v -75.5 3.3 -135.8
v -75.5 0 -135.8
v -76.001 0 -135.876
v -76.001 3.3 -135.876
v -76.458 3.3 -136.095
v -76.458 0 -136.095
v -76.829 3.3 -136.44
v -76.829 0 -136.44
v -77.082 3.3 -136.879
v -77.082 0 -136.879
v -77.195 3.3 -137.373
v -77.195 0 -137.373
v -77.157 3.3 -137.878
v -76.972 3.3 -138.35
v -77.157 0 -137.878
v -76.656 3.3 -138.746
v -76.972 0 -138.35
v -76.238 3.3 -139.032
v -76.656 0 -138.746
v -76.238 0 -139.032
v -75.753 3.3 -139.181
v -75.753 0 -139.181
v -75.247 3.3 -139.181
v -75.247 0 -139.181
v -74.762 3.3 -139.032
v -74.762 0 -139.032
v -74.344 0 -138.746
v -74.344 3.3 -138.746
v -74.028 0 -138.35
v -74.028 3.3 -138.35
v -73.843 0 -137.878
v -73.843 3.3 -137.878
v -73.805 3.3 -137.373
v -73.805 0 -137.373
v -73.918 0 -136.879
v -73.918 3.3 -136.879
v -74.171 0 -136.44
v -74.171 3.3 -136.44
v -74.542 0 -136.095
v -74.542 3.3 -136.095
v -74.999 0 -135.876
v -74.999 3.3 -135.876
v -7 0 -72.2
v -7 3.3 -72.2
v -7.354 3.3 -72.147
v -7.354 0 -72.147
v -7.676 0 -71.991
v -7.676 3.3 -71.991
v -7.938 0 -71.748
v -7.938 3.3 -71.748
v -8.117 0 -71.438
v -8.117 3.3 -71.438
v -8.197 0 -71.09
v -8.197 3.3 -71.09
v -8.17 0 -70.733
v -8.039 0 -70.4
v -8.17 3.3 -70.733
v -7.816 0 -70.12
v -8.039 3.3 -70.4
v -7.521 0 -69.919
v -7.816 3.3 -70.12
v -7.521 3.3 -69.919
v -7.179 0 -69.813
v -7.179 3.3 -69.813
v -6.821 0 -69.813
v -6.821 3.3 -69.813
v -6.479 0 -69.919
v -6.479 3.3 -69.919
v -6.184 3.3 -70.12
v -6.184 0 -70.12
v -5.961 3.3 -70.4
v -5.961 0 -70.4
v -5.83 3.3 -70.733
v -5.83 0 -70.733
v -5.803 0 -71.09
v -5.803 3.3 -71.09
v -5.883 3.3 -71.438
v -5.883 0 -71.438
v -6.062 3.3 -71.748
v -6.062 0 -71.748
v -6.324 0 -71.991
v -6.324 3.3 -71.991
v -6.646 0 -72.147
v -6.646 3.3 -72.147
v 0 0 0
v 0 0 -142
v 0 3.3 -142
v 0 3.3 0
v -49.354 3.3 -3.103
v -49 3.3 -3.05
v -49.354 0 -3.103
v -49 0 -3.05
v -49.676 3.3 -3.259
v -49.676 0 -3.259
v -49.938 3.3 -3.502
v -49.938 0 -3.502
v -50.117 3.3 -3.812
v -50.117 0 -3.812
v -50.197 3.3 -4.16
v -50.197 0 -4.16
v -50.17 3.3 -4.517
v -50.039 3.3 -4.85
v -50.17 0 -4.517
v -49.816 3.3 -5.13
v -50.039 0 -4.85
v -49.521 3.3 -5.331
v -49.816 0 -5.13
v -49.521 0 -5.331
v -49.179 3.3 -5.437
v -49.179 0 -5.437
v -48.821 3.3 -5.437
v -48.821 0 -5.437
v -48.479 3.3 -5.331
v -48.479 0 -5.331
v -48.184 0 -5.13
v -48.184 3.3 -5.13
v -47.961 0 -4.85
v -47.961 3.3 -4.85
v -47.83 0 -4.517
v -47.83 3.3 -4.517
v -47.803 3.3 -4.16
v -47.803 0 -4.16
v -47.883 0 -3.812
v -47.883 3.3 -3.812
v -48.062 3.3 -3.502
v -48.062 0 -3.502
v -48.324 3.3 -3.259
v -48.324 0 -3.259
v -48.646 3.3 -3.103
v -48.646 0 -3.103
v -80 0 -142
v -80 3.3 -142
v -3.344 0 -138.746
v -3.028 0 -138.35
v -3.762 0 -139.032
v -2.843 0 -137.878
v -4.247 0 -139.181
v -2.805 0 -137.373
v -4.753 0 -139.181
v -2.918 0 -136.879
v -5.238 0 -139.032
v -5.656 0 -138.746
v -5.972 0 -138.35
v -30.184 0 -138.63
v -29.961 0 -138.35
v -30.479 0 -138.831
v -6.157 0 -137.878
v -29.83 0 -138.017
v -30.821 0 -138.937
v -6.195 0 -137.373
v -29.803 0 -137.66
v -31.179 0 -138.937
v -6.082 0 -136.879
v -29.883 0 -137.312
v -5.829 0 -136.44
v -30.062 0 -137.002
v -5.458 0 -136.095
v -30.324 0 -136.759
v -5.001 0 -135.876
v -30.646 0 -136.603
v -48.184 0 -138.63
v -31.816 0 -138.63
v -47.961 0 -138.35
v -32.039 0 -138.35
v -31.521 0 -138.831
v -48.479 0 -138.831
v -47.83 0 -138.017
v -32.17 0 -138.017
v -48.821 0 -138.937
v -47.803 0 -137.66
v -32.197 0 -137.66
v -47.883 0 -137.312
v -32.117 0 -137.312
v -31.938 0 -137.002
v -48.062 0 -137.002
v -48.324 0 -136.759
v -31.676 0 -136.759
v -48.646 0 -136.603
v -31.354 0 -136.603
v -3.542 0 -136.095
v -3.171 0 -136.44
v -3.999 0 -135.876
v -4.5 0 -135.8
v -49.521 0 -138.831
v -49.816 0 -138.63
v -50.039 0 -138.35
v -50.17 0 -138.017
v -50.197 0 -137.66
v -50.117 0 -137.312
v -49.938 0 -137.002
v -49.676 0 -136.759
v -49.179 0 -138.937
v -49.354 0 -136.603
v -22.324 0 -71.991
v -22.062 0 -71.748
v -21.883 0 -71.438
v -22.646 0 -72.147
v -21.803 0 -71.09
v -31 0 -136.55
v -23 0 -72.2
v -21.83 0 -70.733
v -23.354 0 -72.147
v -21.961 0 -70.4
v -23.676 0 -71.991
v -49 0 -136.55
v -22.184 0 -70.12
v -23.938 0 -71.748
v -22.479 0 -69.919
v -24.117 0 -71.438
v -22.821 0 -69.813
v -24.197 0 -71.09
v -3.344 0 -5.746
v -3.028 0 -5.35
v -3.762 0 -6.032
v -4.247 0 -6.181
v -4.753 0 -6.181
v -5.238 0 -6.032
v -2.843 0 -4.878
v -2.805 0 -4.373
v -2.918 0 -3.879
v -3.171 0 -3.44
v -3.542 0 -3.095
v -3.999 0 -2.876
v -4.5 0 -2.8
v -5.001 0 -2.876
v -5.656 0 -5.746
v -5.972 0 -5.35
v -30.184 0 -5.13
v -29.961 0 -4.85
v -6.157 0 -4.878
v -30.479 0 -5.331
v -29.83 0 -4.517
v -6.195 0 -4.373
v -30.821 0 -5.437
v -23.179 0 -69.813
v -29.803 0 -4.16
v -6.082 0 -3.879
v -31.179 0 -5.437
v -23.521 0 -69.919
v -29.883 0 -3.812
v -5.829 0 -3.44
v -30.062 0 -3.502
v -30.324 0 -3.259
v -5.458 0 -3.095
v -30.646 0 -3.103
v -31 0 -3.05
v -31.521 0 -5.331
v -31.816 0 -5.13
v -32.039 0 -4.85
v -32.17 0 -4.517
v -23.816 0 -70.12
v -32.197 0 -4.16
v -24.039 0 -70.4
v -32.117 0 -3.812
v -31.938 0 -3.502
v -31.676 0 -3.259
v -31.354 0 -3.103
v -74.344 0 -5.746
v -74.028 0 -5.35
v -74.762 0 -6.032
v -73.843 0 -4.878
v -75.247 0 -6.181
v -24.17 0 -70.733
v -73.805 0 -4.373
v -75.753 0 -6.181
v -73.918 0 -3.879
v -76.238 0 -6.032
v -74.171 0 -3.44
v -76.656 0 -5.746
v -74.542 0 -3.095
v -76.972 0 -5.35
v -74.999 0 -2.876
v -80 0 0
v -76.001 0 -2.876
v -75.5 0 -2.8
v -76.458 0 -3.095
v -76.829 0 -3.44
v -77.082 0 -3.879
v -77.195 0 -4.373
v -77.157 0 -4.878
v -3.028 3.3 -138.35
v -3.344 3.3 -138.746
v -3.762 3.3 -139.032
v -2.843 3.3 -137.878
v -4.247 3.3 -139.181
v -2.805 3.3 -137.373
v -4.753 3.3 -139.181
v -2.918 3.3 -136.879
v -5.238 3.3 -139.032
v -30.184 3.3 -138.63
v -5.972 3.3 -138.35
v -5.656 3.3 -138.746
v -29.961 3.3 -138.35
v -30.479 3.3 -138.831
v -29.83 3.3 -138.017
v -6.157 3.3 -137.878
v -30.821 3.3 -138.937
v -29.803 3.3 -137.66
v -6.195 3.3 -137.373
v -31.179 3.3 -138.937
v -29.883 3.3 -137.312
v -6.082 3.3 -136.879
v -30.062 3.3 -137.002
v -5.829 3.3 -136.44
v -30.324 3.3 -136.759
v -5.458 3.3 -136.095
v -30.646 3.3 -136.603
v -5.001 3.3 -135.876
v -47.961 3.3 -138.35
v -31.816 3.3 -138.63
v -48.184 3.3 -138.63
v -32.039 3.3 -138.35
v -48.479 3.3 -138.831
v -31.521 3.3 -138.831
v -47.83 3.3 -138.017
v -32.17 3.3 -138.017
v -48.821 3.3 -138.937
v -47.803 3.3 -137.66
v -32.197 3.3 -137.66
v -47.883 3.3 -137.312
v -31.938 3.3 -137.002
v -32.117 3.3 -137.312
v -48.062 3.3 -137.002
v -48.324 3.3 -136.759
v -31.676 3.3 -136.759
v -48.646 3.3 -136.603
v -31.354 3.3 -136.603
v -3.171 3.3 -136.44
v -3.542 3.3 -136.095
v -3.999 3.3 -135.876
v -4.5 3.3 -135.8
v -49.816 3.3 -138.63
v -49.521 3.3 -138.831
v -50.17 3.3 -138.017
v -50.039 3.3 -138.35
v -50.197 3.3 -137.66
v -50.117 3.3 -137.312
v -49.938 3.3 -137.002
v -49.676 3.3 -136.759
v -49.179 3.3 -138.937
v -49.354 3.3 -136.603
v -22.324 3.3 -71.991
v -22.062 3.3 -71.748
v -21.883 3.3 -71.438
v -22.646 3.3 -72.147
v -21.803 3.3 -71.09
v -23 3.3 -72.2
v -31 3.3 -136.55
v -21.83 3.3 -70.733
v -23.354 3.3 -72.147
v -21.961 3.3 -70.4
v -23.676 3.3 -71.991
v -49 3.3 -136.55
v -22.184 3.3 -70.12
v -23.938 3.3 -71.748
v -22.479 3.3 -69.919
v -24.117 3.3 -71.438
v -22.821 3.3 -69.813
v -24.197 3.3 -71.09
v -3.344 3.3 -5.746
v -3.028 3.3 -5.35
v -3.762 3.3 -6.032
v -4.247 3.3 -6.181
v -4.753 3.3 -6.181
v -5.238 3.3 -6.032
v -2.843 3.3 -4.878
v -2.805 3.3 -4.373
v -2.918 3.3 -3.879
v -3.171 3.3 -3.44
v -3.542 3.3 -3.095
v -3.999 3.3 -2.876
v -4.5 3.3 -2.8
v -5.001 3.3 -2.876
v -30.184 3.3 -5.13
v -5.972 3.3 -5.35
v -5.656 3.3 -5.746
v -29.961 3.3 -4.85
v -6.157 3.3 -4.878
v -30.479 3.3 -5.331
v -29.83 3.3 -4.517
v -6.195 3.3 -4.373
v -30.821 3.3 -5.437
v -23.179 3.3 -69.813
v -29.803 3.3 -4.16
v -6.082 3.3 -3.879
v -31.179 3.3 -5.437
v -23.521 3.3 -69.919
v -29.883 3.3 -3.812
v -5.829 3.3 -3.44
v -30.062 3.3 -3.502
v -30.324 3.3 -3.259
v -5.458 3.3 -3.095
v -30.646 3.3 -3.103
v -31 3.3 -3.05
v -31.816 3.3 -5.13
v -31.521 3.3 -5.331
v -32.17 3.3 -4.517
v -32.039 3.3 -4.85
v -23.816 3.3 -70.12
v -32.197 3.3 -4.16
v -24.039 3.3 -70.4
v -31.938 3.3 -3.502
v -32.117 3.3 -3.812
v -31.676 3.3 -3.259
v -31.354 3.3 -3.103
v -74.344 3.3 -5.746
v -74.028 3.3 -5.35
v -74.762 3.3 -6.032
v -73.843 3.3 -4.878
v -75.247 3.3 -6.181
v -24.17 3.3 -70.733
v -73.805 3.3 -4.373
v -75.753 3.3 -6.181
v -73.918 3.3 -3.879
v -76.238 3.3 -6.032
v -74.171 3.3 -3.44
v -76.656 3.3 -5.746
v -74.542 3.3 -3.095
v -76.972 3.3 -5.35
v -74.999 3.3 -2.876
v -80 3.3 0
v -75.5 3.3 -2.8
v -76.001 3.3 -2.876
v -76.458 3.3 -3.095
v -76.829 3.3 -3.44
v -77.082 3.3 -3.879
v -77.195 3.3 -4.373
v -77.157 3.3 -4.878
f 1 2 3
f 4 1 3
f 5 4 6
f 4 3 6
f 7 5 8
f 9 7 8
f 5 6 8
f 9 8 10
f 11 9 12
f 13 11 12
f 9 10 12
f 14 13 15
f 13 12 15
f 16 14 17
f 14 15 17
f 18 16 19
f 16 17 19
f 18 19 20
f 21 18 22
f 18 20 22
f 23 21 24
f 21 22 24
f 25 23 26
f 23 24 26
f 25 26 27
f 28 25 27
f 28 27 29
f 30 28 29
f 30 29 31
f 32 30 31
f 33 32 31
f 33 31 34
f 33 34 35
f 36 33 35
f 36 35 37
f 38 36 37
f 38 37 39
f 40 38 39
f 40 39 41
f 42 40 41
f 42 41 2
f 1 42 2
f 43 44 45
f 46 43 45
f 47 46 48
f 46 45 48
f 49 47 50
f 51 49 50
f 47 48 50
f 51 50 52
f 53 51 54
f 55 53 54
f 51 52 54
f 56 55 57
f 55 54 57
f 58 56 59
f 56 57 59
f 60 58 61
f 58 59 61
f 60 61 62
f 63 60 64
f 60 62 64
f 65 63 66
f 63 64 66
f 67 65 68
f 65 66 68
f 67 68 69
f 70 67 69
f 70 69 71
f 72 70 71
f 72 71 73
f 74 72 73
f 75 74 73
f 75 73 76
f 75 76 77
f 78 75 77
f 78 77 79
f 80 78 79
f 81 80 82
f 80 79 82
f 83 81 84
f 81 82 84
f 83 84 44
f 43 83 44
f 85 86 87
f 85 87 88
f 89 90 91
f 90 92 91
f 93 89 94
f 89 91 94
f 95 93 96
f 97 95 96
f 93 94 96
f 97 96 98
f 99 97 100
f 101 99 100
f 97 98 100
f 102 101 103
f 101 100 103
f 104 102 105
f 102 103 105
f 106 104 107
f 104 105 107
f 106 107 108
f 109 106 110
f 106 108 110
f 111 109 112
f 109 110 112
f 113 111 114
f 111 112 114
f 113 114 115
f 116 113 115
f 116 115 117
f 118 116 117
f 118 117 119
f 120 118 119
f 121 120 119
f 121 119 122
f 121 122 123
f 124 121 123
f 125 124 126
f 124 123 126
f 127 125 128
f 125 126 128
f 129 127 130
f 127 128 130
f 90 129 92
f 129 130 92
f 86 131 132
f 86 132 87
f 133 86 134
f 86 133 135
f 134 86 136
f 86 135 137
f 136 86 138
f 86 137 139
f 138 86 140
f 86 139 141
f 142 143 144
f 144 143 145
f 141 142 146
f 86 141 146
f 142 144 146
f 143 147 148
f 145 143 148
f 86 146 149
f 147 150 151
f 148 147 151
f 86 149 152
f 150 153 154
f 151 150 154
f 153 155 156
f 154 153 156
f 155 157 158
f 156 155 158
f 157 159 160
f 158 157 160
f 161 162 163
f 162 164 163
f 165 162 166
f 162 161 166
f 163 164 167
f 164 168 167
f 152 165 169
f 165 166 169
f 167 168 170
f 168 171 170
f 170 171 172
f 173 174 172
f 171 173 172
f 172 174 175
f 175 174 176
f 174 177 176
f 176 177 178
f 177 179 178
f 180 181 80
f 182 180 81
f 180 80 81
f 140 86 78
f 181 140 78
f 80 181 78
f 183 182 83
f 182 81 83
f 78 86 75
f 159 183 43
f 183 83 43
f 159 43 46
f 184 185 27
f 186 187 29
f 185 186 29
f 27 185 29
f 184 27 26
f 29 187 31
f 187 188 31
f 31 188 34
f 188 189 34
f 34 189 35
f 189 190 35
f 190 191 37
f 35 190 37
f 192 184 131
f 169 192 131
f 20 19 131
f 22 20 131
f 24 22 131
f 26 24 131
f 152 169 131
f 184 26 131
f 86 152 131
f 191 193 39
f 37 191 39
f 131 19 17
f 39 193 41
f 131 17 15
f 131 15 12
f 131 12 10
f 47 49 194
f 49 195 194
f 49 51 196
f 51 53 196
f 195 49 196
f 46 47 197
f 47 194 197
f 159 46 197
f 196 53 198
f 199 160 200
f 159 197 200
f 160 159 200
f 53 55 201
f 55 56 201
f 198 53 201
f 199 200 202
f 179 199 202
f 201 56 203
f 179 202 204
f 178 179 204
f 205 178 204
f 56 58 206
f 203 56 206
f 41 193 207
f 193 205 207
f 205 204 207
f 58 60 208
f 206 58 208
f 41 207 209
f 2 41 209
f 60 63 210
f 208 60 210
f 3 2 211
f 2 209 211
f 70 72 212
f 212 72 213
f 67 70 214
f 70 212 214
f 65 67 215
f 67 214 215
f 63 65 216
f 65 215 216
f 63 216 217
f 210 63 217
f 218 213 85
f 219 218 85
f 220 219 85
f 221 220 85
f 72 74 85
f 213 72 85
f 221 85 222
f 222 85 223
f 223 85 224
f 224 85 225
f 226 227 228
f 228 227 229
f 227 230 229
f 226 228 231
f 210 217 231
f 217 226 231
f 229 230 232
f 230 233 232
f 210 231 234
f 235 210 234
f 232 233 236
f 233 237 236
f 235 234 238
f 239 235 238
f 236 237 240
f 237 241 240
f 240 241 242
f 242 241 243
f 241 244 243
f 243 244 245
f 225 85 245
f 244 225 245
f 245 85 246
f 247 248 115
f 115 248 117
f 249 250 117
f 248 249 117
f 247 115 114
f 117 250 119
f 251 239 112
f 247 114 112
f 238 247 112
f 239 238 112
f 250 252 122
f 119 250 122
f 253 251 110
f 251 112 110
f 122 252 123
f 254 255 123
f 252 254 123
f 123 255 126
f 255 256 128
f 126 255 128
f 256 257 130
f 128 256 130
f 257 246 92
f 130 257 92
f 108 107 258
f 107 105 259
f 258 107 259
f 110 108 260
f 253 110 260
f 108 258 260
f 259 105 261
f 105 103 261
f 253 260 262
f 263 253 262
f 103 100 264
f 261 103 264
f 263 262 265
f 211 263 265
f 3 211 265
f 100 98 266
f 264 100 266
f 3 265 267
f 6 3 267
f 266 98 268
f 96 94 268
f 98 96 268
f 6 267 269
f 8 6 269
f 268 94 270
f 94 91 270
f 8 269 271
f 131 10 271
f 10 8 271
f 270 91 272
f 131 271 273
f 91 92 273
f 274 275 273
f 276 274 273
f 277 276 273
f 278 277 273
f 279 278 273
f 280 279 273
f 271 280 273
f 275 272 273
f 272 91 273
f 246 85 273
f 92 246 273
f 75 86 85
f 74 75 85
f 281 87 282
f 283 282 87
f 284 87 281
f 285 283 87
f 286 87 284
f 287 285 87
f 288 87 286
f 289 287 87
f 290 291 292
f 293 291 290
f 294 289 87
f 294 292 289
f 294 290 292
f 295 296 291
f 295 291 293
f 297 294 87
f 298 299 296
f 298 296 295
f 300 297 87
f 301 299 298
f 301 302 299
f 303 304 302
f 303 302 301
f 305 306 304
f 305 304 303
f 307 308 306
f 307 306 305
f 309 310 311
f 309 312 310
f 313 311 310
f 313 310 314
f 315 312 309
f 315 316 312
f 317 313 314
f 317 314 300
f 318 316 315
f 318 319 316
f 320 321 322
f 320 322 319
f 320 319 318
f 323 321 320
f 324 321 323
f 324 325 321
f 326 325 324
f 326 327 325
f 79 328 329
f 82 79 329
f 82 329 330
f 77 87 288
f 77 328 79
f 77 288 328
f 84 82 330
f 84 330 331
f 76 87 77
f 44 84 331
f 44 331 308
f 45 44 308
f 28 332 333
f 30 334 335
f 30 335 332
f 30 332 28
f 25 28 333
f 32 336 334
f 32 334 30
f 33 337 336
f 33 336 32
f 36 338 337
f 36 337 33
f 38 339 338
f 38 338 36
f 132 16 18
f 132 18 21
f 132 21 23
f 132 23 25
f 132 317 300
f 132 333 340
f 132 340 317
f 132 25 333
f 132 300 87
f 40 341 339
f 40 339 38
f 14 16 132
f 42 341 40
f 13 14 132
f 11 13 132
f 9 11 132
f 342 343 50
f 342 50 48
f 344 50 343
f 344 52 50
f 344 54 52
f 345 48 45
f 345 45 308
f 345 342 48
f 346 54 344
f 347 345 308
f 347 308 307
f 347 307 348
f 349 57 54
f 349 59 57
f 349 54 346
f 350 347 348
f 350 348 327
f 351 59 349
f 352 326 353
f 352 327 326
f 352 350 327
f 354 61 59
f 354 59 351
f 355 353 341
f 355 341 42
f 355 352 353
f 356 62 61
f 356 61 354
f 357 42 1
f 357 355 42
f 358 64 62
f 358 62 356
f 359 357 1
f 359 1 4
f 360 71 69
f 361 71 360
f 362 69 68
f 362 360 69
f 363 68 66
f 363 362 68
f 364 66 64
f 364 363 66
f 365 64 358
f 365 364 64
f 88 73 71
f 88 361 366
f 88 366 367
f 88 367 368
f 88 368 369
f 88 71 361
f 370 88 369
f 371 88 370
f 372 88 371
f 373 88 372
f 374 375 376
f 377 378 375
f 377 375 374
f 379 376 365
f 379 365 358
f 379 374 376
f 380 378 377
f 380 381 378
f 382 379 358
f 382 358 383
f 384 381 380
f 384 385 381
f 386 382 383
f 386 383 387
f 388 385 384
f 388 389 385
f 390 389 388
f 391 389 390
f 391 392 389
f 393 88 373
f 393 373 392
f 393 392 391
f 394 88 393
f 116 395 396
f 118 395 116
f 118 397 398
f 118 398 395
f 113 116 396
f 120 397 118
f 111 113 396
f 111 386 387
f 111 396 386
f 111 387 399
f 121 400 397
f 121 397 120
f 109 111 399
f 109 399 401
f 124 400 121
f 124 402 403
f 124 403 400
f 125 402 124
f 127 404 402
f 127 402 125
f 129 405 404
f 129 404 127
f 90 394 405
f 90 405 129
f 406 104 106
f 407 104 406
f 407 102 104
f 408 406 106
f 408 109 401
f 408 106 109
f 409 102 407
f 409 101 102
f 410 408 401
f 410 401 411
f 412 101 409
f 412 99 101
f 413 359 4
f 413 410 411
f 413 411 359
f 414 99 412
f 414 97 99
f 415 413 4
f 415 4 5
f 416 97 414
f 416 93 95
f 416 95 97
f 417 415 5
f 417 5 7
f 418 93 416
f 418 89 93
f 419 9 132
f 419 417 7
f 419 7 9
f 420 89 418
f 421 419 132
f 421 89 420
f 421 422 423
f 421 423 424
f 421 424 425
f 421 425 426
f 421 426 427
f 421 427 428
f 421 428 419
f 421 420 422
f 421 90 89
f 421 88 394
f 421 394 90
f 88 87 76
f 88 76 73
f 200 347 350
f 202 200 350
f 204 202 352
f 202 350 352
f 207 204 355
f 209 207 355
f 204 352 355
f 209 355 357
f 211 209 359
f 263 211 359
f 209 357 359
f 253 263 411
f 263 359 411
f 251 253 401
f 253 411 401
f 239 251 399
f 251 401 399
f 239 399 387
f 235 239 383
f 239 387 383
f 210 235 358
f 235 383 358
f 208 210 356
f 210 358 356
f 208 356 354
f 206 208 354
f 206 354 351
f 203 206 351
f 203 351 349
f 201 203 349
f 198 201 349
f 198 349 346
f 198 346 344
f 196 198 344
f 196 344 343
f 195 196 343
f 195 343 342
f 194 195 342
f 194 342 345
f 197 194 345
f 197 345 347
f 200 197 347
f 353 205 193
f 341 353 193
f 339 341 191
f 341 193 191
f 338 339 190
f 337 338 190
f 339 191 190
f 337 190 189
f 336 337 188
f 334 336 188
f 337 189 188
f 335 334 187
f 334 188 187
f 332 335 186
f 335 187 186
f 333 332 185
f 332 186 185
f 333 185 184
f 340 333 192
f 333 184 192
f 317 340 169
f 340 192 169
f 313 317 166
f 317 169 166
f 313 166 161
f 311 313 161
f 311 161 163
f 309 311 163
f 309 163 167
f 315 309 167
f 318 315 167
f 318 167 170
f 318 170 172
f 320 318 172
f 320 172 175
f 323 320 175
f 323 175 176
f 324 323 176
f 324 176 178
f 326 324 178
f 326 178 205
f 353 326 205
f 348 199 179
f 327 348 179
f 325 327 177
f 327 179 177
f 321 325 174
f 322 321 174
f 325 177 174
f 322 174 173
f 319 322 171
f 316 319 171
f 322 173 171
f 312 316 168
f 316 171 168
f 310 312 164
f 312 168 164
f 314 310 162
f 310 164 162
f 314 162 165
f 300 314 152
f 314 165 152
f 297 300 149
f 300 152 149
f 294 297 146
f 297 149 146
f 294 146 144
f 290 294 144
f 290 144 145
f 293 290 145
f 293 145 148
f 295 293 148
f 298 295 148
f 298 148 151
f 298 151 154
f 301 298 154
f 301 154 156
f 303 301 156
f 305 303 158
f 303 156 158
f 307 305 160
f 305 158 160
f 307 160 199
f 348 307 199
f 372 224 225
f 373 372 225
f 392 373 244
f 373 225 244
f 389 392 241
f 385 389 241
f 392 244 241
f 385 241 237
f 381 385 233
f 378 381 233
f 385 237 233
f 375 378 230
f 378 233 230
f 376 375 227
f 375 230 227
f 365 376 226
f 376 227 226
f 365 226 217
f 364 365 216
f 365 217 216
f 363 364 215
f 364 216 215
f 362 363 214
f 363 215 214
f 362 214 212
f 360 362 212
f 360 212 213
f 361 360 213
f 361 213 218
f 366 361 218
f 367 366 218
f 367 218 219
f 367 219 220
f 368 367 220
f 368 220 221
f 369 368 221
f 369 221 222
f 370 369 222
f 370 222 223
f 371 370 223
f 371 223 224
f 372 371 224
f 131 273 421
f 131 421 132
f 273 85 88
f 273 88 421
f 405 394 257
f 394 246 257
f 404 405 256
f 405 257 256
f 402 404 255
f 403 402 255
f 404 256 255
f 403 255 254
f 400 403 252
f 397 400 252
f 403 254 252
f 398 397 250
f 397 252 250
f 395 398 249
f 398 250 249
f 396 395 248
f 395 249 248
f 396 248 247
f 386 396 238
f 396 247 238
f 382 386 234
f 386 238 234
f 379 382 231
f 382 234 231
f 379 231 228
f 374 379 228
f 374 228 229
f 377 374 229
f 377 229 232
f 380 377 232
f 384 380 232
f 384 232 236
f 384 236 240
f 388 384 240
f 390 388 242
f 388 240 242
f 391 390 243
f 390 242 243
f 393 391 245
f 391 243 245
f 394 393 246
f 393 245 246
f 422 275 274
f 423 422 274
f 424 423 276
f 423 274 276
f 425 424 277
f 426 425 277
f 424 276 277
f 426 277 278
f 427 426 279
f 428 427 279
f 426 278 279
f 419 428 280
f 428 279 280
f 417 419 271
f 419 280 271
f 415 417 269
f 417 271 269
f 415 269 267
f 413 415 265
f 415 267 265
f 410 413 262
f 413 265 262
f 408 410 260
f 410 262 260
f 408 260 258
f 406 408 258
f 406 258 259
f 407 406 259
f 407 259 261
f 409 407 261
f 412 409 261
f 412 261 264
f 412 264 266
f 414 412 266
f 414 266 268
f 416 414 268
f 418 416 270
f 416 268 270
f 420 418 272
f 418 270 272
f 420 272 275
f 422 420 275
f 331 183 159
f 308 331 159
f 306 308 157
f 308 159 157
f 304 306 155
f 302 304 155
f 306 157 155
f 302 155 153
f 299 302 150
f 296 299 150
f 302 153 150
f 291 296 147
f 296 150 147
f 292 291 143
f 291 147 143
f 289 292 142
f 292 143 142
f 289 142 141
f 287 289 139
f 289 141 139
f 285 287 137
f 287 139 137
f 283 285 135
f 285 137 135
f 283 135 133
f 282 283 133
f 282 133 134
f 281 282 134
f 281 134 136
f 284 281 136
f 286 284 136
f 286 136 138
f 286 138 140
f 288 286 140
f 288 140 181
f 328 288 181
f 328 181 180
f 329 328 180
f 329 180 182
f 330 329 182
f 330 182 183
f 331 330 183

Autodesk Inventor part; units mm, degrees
ref_plane "YZ Plane" through (0, 0, 0) normal (1, 0, 0) x (0, 1, 0)
ref_plane "XZ Plane" through (0, 0, 0) normal (0, 1, 0) x (-1, 0, 0)
ref_plane "XY Plane" through (0, 0, 0) normal (0, 0, 1) x (1, 0, 0)
sketch "スケッチ1" plane through (0, 0, 0) normal (0, 1, 0) x (-1, 0, 0)
  line L0 (0, 0) -> (80, 0)
  line L1 (80, 0) -> (80, -142)
  line L2 (80, -142) -> (0, -142)
  line L3 (0, -142) -> (0, 0)
  dimension "d0" = 80
  dimension "d1" = 142
extrude "押し出し1" add sketch "スケッチ1" along normal blind 3.3
hole "穴1" at (-75.5, 3.3, -4.5) direction (0, -1, 0) diameter 3.4 end through all
hole "穴2" at (-4.5, 3.3, -4.5) direction (0, -1, 0) diameter 3.4 end through all
hole "穴3" at (-4.5, 3.3, -137.5) direction (0, -1, 0) diameter 3.4 end through all
hole "穴4" at (-75.5, 3.3, -137.5) direction (0, -1, 0) diameter 3.4 end through all
hole "穴5" at (-49, 3.3, -137.75) direction (0, -1, 0) diameter 2.4 end through all
hole "穴6" at (-31, 3.3, -137.75) direction (0, -1, 0) diameter 2.4 end through all
hole "穴7" at (-31, 3.3, -4.25) direction (0, -1, 0) diameter 2.4 end through all
hole "穴8" at (-49, 3.3, -4.25) direction (0, -1, 0) diameter 2.4 end through all
hole "穴9" at (-7, 0, -71) direction (0, 1, 0) diameter 2.4 end through all
hole "穴10" at (-23, 0, -71) direction (0, 1, 0) diameter 2.4 end through all
properties part number "基本板" material "アルミニウム 5052"
